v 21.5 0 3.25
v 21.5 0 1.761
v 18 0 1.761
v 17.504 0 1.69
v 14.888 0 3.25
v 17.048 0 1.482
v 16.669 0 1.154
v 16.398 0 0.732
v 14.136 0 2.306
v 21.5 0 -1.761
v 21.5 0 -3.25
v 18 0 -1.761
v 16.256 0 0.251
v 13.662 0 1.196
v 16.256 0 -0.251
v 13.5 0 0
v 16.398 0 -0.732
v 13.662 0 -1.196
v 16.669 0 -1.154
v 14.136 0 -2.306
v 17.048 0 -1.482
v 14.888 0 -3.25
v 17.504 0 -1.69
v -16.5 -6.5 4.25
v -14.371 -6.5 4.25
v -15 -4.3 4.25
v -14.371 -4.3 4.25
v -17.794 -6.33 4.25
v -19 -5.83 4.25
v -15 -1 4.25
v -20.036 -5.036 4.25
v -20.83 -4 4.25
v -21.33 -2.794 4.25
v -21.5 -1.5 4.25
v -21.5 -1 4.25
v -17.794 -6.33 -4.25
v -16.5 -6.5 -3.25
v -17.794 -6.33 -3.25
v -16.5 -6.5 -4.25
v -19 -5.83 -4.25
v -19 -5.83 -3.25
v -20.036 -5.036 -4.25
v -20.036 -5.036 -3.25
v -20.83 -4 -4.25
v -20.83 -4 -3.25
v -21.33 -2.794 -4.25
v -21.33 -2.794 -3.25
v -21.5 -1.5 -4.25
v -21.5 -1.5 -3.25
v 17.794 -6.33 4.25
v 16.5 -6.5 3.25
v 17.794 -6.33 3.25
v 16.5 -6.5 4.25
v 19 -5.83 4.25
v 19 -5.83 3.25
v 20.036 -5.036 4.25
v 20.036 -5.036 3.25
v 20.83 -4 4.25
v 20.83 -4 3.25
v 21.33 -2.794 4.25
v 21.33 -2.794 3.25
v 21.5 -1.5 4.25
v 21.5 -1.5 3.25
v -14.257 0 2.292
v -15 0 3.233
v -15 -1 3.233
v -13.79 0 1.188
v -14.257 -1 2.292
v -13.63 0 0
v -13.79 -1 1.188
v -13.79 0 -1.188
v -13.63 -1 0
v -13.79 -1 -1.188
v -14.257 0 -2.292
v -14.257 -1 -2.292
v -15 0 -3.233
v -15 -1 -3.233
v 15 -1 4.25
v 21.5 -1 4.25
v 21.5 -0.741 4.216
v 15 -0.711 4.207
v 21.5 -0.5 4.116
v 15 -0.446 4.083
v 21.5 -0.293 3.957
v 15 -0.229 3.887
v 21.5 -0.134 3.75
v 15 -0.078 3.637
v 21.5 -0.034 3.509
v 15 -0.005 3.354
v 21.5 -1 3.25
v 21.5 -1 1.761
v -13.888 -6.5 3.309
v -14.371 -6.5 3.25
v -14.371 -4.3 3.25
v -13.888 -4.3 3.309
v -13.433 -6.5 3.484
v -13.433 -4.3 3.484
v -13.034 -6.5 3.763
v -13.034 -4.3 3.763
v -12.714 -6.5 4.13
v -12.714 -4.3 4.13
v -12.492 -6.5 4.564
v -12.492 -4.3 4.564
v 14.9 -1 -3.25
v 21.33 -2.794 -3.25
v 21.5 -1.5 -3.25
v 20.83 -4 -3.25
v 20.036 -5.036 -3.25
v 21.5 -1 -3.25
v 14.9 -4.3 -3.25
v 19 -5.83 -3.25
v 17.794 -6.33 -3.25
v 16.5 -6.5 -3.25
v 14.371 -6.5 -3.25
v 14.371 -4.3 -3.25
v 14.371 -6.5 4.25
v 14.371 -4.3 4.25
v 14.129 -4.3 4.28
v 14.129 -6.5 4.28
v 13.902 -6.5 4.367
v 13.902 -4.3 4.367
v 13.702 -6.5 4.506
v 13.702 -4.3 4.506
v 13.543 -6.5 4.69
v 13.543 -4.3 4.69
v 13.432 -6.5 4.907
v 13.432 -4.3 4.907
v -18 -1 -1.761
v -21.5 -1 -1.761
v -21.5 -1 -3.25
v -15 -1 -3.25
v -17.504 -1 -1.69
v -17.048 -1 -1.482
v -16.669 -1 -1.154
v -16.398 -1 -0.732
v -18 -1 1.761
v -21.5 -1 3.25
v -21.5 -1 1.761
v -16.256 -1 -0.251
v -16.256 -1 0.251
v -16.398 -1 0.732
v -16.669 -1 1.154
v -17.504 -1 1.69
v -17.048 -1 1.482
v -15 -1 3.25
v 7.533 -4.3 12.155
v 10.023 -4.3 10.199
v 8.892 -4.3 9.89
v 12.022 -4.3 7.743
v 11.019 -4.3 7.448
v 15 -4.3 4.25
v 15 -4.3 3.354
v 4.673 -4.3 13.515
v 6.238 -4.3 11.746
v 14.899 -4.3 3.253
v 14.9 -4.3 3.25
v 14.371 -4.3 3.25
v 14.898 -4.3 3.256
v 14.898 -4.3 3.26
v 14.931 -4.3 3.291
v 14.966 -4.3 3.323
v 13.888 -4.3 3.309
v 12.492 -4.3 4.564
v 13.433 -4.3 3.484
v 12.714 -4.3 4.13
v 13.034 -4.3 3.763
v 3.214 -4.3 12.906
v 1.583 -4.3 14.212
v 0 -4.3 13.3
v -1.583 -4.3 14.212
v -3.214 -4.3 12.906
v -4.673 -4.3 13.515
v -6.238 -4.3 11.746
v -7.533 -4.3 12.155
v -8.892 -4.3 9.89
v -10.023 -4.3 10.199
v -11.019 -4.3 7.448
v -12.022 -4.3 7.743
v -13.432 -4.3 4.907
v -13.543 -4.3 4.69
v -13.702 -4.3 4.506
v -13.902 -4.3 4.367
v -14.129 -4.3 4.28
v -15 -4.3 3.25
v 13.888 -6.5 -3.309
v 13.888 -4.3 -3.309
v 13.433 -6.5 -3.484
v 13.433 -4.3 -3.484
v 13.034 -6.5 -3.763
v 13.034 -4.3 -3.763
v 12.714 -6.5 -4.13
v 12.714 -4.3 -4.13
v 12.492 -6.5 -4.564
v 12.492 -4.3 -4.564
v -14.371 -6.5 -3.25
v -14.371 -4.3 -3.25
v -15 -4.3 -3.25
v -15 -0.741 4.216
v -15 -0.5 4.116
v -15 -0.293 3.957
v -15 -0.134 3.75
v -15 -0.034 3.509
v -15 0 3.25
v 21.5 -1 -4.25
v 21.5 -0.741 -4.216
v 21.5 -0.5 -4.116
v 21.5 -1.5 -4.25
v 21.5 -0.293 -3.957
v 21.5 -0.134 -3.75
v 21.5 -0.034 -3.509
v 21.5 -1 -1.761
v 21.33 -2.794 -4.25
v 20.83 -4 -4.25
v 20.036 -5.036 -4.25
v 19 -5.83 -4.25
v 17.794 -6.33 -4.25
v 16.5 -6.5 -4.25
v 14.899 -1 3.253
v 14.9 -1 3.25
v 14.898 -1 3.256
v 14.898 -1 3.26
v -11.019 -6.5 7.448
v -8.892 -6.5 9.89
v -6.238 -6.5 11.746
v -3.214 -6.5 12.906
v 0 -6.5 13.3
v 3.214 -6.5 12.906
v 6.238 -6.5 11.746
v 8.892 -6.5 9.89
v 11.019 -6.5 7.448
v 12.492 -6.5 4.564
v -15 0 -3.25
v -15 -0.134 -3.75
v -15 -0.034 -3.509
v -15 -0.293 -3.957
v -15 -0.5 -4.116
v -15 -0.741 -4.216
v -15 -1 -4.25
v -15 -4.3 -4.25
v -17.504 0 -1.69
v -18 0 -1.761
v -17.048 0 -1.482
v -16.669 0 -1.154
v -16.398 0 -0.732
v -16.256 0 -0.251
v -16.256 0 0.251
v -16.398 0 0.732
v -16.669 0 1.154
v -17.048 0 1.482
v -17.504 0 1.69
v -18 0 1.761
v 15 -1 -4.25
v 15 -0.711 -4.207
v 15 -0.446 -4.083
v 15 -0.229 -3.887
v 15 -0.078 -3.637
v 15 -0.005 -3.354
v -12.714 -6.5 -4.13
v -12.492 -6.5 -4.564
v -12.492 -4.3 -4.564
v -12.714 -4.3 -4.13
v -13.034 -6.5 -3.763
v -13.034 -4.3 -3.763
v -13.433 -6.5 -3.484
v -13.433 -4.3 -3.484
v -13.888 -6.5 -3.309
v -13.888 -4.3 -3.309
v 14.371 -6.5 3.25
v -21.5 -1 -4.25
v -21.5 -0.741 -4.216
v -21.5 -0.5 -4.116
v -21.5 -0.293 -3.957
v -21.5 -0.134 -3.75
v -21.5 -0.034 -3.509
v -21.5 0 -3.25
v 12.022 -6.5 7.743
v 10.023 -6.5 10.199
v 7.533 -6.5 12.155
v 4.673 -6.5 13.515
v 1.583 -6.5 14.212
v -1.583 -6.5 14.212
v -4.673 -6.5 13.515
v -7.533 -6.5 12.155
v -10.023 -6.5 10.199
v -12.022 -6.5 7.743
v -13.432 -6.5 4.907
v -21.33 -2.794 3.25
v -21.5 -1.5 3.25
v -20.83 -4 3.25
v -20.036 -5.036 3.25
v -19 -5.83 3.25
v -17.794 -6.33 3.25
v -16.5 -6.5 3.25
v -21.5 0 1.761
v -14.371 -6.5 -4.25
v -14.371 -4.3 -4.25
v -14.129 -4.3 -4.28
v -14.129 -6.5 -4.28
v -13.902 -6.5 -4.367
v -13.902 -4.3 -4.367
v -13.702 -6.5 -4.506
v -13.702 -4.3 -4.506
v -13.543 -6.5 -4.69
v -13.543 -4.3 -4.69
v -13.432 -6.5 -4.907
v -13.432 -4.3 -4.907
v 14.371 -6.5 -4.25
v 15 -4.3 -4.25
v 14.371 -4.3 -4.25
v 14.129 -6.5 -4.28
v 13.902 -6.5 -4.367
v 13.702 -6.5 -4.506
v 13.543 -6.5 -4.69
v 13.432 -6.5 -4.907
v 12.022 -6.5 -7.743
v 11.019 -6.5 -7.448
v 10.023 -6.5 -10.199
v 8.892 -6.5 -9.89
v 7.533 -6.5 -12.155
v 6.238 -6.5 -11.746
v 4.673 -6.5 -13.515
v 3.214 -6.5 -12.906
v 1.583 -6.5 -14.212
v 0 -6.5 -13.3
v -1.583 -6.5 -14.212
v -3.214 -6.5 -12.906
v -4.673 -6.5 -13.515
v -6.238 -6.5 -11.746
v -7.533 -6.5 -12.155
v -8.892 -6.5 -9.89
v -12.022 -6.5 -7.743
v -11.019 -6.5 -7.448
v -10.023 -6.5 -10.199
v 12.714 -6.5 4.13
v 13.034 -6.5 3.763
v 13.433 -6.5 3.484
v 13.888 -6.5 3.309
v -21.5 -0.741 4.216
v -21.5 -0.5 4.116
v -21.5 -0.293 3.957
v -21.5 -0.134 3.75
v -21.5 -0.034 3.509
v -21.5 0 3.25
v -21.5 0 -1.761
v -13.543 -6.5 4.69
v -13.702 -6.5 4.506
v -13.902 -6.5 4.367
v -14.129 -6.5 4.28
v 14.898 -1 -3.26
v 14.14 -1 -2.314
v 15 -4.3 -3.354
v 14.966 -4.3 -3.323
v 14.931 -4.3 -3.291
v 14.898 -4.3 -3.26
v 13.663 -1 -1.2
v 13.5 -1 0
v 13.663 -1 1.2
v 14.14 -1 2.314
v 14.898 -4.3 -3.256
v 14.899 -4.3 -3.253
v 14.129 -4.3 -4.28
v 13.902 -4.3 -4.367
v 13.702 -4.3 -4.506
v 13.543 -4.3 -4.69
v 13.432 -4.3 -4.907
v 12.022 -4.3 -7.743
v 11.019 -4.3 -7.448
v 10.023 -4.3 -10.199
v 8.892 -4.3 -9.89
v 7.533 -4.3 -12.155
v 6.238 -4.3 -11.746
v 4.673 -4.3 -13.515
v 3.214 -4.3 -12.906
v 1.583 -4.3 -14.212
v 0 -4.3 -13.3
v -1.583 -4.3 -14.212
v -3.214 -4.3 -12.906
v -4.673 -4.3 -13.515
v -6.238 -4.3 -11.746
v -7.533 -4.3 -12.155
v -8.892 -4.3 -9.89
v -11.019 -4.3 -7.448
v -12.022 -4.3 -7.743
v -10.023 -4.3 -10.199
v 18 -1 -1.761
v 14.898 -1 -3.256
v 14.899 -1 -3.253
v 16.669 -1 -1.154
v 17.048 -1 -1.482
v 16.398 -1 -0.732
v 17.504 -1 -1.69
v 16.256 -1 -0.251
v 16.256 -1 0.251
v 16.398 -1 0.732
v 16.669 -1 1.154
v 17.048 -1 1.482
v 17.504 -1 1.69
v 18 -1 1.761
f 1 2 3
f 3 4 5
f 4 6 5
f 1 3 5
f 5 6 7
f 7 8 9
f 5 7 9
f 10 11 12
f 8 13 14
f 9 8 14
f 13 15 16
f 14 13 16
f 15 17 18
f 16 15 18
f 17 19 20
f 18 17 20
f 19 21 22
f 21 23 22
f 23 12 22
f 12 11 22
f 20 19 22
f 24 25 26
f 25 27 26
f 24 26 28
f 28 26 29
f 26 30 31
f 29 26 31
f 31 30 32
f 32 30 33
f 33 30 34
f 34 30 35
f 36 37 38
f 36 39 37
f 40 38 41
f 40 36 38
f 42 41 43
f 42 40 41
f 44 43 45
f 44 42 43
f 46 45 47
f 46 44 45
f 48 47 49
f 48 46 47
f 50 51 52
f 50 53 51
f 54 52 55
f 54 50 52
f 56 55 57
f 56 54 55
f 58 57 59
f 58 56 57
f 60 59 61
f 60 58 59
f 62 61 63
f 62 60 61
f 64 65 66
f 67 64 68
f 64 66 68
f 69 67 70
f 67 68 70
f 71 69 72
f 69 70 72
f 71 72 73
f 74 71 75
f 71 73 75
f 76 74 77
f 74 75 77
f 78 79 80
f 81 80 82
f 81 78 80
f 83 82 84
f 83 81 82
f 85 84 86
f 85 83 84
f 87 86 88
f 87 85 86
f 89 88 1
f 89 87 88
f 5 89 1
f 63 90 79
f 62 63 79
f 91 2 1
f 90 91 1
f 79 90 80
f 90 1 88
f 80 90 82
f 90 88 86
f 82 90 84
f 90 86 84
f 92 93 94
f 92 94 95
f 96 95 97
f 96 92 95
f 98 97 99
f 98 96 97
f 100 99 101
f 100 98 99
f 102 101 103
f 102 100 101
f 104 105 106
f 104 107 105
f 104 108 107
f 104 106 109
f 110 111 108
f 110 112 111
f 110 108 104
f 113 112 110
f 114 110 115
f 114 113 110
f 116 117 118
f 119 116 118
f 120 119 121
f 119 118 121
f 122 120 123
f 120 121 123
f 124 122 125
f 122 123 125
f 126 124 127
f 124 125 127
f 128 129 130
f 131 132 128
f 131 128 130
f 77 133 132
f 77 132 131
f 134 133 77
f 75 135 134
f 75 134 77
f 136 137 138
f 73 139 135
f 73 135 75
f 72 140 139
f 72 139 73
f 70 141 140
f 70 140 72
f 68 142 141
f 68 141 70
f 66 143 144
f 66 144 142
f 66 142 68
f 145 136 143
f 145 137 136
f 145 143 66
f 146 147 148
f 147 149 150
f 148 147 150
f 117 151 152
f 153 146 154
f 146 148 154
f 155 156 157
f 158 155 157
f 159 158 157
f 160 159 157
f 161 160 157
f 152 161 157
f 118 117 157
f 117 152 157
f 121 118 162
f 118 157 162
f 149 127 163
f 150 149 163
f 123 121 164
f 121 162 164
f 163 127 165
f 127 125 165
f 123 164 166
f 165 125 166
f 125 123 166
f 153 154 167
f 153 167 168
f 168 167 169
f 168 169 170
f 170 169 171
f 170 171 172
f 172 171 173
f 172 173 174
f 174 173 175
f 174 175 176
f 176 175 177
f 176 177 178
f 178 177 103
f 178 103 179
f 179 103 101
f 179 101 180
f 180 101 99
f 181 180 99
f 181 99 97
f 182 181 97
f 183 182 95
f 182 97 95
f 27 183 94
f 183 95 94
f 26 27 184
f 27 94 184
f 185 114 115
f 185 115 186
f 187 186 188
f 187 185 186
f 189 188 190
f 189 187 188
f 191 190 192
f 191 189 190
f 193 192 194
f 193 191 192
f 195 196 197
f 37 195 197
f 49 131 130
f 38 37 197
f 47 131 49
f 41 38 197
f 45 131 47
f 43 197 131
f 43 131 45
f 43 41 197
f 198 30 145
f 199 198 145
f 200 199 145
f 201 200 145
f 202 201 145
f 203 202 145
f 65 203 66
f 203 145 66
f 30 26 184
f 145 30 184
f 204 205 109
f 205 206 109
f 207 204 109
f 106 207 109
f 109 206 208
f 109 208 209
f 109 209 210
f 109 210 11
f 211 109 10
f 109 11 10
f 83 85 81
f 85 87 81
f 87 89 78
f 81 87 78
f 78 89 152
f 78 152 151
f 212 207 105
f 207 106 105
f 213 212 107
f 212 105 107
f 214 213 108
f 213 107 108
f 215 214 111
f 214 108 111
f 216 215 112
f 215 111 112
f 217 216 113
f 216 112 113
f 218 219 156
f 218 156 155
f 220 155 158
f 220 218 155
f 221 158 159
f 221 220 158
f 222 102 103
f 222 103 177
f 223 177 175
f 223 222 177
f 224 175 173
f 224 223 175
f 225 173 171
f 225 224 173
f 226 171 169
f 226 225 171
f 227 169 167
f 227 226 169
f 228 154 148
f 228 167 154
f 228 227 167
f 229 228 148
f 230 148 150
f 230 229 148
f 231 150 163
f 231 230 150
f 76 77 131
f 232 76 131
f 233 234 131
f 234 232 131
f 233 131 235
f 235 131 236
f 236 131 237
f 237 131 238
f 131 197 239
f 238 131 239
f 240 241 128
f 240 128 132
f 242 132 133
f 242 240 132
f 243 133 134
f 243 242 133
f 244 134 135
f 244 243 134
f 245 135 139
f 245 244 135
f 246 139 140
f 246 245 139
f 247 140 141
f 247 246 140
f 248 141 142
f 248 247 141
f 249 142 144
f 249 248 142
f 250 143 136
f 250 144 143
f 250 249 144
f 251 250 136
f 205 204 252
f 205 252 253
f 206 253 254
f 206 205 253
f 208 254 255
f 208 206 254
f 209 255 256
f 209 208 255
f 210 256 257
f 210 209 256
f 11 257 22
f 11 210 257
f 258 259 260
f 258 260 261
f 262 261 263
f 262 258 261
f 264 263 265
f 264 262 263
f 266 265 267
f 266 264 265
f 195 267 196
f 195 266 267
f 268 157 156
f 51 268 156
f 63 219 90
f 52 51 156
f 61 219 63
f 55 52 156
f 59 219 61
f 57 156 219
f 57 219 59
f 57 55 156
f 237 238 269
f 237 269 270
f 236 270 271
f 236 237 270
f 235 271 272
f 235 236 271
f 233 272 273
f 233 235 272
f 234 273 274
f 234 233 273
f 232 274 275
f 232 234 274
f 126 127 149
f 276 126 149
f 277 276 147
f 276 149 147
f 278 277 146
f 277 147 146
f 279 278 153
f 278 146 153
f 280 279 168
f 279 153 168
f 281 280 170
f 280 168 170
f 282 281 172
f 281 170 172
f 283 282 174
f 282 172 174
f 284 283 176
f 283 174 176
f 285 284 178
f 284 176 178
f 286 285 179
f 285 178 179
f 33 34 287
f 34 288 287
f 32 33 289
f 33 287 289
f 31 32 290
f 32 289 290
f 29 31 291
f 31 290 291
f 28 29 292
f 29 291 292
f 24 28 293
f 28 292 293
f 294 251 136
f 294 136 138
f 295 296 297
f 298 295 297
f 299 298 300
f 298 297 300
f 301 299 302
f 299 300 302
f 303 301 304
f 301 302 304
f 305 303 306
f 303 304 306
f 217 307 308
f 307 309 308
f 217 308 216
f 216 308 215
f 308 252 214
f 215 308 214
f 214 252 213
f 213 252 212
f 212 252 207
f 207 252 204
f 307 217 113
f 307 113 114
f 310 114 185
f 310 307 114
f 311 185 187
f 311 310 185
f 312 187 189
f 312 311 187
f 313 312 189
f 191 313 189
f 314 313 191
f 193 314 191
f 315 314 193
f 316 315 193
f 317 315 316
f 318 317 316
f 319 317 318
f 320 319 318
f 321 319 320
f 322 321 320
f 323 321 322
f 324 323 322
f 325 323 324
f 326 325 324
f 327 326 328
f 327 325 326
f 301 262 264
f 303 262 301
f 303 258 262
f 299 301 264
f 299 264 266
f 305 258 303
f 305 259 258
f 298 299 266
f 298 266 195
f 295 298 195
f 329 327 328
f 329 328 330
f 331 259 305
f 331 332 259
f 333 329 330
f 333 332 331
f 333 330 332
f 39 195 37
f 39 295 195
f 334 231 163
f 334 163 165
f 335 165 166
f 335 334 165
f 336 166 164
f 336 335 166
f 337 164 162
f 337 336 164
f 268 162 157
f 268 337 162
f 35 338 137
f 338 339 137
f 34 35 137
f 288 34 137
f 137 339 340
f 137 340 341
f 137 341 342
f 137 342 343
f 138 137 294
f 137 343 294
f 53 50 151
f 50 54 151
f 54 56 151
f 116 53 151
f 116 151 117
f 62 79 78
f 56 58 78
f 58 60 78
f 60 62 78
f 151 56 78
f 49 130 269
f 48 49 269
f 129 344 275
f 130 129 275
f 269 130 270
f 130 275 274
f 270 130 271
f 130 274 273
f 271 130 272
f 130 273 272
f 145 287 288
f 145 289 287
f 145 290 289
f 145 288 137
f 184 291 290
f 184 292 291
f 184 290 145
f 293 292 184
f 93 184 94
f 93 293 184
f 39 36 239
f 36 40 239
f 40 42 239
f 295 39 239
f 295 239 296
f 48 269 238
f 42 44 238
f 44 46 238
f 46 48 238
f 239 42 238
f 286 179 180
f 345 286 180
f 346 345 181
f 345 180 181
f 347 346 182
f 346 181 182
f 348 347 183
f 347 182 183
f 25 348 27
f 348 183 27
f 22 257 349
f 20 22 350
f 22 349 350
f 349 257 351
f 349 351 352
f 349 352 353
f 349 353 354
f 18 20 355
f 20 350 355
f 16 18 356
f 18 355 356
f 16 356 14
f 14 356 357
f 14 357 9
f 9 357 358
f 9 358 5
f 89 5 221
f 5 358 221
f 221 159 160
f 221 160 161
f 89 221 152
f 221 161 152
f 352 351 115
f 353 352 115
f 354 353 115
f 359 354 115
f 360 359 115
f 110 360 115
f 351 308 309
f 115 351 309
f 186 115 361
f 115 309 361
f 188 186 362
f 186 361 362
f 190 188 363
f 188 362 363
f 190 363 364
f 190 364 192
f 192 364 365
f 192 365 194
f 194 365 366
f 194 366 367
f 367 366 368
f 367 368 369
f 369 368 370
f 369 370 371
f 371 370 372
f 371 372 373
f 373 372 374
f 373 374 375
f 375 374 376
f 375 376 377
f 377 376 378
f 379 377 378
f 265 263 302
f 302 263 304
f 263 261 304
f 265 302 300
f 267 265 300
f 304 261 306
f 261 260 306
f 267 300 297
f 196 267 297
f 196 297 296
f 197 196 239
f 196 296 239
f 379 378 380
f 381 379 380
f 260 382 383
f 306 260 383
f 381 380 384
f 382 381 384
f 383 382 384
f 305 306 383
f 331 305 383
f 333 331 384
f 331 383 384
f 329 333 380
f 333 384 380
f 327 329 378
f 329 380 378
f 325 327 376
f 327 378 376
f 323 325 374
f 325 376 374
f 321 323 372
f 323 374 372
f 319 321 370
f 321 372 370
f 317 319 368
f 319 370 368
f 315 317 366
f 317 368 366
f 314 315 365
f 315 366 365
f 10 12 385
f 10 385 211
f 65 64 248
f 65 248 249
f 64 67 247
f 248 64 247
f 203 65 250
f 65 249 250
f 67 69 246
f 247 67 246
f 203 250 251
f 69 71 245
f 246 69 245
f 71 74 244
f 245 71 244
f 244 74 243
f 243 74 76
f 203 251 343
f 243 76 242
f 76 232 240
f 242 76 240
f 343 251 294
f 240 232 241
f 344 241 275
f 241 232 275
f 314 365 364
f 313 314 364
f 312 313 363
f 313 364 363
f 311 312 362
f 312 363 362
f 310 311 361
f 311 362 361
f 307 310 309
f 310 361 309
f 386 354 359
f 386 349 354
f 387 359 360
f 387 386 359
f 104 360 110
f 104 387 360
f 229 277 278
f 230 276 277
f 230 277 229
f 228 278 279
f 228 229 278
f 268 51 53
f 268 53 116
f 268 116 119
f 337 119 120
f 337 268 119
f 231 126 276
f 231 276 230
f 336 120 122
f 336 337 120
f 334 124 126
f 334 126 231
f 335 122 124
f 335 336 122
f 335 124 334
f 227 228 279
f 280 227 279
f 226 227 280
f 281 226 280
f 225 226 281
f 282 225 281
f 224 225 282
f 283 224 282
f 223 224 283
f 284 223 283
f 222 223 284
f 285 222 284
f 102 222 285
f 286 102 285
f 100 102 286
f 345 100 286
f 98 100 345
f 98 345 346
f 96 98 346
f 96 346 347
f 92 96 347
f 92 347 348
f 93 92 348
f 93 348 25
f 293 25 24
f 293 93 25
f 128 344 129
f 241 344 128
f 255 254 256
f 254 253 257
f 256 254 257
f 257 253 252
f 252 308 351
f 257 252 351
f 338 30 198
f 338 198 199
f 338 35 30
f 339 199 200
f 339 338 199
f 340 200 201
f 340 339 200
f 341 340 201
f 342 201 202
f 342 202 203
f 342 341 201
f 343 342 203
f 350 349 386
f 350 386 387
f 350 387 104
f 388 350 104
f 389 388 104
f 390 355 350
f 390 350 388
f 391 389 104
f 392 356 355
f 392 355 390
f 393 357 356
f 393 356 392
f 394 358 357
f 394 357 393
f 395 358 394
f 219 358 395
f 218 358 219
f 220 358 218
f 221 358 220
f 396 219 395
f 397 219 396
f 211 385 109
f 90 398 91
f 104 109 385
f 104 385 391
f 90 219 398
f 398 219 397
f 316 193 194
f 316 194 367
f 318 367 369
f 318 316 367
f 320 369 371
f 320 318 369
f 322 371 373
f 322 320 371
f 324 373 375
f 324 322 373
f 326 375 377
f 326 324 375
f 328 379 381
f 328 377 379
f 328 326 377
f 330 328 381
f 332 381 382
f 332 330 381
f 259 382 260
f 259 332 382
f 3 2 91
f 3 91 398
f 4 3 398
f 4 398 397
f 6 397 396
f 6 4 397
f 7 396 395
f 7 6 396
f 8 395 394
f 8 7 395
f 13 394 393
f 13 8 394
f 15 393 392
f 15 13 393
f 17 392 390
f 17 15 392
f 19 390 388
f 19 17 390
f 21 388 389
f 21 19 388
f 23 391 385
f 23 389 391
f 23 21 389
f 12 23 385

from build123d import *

# Parameters (mm, degrees)
EXTRUDE1_DEPTH = 6.5
FILLET1_R      = 1
SHELL2_START   = -6.5
SHELL2_DEPTH   = 5.5
SKETCH2_R      = 15.25
EXTRUDE2_DEPTH = 3.3
EXTRUDE3_DEPTH = 27.626866185
EXTRUDE4_START = -4.3
EXTRUDE4_DEPTH = 4.3
FILLET2_R      = 5


# Read off the part's stored shape, not the designer's step: Shell2
with BuildPart() as part:
    # Sketch1 → Extrude1 (new body)
    with BuildSketch(Plane(origin=(0, 0, 0), x_dir=(1, 0, 0), z_dir=(0, 1, 0))):
        with BuildLine():
            Line((-21.5, 4.25), (-14.371064679, 4.25))
            ThreePointArc((-14.371064679, 4.25), (-13.797975355, 4.430507091), (-13.431779406, 4.906862745))
            ThreePointArc((-13.431779406, 4.906862745), (0, 14.3), (13.431779406, 4.906862745))
            ThreePointArc((13.431779406, 4.906862745), (13.797975355, 4.430507091), (14.371064679, 4.25))
            Line((14.371064679, 4.25), (21.5, 4.25))
            Line((21.5, 4.25), (21.5, -4.25))
            Line((21.5, -4.25), (14.371064679, -4.25))
            ThreePointArc((14.371064679, -4.25), (13.797975355, -4.430507091), (13.431779406, -4.906862745))
            ThreePointArc((13.431779406, -4.906862745), (0, -14.3), (-13.431779406, -4.906862745))
            ThreePointArc((-13.431779406, -4.906862745), (-13.797975355, -4.430507091), (-14.371064679, -4.25))
            Line((-14.371064679, -4.25), (-21.5, -4.25))
            Line((-21.5, -4.25), (-21.5, 4.25))
        make_face()
    extrude(amount=-EXTRUDE1_DEPTH)

    # Fillet1
    fillet1_edges = [part.edges().sort_by_distance(p)[0] for p in [
        (-17.935532339, 0, -4.25),
        (-13.797975355, 0, -4.430507091),
        (0, 0, -14.3),
        (13.797975355, 0, -4.430507091),
        (17.935532339, 0, -4.25),
        (17.935532339, 0, 4.25),
        (13.797975355, 0, 4.430507091),
        (0, 0, 14.3),
        (-13.797975355, 0, 4.430507091),
        (-17.935532339, 0, 4.25),
    ]]
    fillet(fillet1_edges, radius=FILLET1_R)

    # Shell2 outline → Shell2 (cut)
    with BuildSketch(Plane(origin=(0, 0, 0), x_dir=(1, 0, 0), z_dir=(0, 1, 0)).offset(SHELL2_START)):
        with BuildLine():
            ThreePointArc((-12.492494132, 4.56372549), (-13.224886032, 3.611014183), (-14.371064679, 3.25))
            Line((-14.371064679, 3.25), (-21.5, 3.25))
            Line((-21.5, 3.25), (-21.5, -3.25))
            Line((-21.5, -3.25), (-14.371064679, -3.25))
            ThreePointArc((-14.371064679, -3.25), (-13.224886032, -3.611014183), (-12.492494132, -4.56372549))
            ThreePointArc((-12.492494132, -4.56372549), (0, -13.3), (12.492494132, -4.56372549))
            ThreePointArc((12.492494132, -4.56372549), (13.224886032, -3.611014183), (14.371064679, -3.25))
            Line((14.371064679, -3.25), (21.5, -3.25))
            Line((21.5, -3.25), (21.5, 3.25))
            Line((21.5, 3.25), (14.371064679, 3.25))
            ThreePointArc((14.371064679, 3.25), (13.224886032, 3.611014183), (12.492494132, 4.56372549))
            ThreePointArc((12.492494132, 4.56372549), (0, 13.3), (-12.492494132, 4.56372549))
        make_face()
    extrude(amount=SHELL2_DEPTH, mode=Mode.SUBTRACT)

    # Sketch2 → Extrude2 (cut)
    with BuildSketch(Plane.XZ.offset(1)):
        Circle(SKETCH2_R)
    extrude(amount=EXTRUDE2_DEPTH, mode=Mode.SUBTRACT)

    # Sketch4 → Extrude3 (cut, through all)
    with BuildSketch(Plane(origin=(0, 0, 0), x_dir=(1, 0, 0), z_dir=(0, 1, 0))):
        with BuildLine():
            Line((18, 1.761490195), (22, 1.761490195))
            Line((22, 1.761490195), (22, -1.761490195))
            Line((22, -1.761490195), (18, -1.761490195))
            ThreePointArc((18, -1.761490195), (16.238509805, 0), (18, 1.761490195))
        make_face()
        with BuildLine():
            Line((-18, -1.761490195), (-22, -1.761490195))
            Line((-22, -1.761490195), (-22, 1.761490195))
            Line((-22, 1.761490195), (-18, 1.761490195))
            ThreePointArc((-18, 1.761490195), (-16.238509805, 0), (-18, -1.761490195))
        make_face()
    extrude(amount=-EXTRUDE3_DEPTH, mode=Mode.SUBTRACT)

    # Sketch5 → Extrude4 (cut)
    with BuildSketch(Plane(origin=(0, 0, 0), x_dir=(1, 0, 0), z_dir=(0, 1, 0)).offset(EXTRUDE4_START)):
        with BuildLine():
            Line((15, -15), (-15, -15))
            Line((-15, -15), (-15, -3.233227979))
            ThreePointArc((-15, -3.233227979), (-13.629894061, 0), (-15, 3.233227979))
            Line((-15, 3.233227979), (-15, 15))
            Line((-15, 15), (15, 15))
            Line((15, 15), (15, 3.354101966))
            ThreePointArc((15, 3.354101966), (13.5, 0), (15, -3.354101966))
            Line((15, -3.354101966), (15, -15))
        make_face()
    extrude(amount=EXTRUDE4_DEPTH, mode=Mode.SUBTRACT)

    # Fillet2
    fillet2_edges = [part.edges().sort_by_distance(p)[0] for p in [
        (21.5, -6.5, 3.75),
        (-21.5, -6.5, -3.75),
        (-21.5, -6.5, 3.75),
        (21.5, -6.5, -3.75),
    ]]
    fillet(fillet2_edges, radius=FILLET2_R)


solid = part.part
